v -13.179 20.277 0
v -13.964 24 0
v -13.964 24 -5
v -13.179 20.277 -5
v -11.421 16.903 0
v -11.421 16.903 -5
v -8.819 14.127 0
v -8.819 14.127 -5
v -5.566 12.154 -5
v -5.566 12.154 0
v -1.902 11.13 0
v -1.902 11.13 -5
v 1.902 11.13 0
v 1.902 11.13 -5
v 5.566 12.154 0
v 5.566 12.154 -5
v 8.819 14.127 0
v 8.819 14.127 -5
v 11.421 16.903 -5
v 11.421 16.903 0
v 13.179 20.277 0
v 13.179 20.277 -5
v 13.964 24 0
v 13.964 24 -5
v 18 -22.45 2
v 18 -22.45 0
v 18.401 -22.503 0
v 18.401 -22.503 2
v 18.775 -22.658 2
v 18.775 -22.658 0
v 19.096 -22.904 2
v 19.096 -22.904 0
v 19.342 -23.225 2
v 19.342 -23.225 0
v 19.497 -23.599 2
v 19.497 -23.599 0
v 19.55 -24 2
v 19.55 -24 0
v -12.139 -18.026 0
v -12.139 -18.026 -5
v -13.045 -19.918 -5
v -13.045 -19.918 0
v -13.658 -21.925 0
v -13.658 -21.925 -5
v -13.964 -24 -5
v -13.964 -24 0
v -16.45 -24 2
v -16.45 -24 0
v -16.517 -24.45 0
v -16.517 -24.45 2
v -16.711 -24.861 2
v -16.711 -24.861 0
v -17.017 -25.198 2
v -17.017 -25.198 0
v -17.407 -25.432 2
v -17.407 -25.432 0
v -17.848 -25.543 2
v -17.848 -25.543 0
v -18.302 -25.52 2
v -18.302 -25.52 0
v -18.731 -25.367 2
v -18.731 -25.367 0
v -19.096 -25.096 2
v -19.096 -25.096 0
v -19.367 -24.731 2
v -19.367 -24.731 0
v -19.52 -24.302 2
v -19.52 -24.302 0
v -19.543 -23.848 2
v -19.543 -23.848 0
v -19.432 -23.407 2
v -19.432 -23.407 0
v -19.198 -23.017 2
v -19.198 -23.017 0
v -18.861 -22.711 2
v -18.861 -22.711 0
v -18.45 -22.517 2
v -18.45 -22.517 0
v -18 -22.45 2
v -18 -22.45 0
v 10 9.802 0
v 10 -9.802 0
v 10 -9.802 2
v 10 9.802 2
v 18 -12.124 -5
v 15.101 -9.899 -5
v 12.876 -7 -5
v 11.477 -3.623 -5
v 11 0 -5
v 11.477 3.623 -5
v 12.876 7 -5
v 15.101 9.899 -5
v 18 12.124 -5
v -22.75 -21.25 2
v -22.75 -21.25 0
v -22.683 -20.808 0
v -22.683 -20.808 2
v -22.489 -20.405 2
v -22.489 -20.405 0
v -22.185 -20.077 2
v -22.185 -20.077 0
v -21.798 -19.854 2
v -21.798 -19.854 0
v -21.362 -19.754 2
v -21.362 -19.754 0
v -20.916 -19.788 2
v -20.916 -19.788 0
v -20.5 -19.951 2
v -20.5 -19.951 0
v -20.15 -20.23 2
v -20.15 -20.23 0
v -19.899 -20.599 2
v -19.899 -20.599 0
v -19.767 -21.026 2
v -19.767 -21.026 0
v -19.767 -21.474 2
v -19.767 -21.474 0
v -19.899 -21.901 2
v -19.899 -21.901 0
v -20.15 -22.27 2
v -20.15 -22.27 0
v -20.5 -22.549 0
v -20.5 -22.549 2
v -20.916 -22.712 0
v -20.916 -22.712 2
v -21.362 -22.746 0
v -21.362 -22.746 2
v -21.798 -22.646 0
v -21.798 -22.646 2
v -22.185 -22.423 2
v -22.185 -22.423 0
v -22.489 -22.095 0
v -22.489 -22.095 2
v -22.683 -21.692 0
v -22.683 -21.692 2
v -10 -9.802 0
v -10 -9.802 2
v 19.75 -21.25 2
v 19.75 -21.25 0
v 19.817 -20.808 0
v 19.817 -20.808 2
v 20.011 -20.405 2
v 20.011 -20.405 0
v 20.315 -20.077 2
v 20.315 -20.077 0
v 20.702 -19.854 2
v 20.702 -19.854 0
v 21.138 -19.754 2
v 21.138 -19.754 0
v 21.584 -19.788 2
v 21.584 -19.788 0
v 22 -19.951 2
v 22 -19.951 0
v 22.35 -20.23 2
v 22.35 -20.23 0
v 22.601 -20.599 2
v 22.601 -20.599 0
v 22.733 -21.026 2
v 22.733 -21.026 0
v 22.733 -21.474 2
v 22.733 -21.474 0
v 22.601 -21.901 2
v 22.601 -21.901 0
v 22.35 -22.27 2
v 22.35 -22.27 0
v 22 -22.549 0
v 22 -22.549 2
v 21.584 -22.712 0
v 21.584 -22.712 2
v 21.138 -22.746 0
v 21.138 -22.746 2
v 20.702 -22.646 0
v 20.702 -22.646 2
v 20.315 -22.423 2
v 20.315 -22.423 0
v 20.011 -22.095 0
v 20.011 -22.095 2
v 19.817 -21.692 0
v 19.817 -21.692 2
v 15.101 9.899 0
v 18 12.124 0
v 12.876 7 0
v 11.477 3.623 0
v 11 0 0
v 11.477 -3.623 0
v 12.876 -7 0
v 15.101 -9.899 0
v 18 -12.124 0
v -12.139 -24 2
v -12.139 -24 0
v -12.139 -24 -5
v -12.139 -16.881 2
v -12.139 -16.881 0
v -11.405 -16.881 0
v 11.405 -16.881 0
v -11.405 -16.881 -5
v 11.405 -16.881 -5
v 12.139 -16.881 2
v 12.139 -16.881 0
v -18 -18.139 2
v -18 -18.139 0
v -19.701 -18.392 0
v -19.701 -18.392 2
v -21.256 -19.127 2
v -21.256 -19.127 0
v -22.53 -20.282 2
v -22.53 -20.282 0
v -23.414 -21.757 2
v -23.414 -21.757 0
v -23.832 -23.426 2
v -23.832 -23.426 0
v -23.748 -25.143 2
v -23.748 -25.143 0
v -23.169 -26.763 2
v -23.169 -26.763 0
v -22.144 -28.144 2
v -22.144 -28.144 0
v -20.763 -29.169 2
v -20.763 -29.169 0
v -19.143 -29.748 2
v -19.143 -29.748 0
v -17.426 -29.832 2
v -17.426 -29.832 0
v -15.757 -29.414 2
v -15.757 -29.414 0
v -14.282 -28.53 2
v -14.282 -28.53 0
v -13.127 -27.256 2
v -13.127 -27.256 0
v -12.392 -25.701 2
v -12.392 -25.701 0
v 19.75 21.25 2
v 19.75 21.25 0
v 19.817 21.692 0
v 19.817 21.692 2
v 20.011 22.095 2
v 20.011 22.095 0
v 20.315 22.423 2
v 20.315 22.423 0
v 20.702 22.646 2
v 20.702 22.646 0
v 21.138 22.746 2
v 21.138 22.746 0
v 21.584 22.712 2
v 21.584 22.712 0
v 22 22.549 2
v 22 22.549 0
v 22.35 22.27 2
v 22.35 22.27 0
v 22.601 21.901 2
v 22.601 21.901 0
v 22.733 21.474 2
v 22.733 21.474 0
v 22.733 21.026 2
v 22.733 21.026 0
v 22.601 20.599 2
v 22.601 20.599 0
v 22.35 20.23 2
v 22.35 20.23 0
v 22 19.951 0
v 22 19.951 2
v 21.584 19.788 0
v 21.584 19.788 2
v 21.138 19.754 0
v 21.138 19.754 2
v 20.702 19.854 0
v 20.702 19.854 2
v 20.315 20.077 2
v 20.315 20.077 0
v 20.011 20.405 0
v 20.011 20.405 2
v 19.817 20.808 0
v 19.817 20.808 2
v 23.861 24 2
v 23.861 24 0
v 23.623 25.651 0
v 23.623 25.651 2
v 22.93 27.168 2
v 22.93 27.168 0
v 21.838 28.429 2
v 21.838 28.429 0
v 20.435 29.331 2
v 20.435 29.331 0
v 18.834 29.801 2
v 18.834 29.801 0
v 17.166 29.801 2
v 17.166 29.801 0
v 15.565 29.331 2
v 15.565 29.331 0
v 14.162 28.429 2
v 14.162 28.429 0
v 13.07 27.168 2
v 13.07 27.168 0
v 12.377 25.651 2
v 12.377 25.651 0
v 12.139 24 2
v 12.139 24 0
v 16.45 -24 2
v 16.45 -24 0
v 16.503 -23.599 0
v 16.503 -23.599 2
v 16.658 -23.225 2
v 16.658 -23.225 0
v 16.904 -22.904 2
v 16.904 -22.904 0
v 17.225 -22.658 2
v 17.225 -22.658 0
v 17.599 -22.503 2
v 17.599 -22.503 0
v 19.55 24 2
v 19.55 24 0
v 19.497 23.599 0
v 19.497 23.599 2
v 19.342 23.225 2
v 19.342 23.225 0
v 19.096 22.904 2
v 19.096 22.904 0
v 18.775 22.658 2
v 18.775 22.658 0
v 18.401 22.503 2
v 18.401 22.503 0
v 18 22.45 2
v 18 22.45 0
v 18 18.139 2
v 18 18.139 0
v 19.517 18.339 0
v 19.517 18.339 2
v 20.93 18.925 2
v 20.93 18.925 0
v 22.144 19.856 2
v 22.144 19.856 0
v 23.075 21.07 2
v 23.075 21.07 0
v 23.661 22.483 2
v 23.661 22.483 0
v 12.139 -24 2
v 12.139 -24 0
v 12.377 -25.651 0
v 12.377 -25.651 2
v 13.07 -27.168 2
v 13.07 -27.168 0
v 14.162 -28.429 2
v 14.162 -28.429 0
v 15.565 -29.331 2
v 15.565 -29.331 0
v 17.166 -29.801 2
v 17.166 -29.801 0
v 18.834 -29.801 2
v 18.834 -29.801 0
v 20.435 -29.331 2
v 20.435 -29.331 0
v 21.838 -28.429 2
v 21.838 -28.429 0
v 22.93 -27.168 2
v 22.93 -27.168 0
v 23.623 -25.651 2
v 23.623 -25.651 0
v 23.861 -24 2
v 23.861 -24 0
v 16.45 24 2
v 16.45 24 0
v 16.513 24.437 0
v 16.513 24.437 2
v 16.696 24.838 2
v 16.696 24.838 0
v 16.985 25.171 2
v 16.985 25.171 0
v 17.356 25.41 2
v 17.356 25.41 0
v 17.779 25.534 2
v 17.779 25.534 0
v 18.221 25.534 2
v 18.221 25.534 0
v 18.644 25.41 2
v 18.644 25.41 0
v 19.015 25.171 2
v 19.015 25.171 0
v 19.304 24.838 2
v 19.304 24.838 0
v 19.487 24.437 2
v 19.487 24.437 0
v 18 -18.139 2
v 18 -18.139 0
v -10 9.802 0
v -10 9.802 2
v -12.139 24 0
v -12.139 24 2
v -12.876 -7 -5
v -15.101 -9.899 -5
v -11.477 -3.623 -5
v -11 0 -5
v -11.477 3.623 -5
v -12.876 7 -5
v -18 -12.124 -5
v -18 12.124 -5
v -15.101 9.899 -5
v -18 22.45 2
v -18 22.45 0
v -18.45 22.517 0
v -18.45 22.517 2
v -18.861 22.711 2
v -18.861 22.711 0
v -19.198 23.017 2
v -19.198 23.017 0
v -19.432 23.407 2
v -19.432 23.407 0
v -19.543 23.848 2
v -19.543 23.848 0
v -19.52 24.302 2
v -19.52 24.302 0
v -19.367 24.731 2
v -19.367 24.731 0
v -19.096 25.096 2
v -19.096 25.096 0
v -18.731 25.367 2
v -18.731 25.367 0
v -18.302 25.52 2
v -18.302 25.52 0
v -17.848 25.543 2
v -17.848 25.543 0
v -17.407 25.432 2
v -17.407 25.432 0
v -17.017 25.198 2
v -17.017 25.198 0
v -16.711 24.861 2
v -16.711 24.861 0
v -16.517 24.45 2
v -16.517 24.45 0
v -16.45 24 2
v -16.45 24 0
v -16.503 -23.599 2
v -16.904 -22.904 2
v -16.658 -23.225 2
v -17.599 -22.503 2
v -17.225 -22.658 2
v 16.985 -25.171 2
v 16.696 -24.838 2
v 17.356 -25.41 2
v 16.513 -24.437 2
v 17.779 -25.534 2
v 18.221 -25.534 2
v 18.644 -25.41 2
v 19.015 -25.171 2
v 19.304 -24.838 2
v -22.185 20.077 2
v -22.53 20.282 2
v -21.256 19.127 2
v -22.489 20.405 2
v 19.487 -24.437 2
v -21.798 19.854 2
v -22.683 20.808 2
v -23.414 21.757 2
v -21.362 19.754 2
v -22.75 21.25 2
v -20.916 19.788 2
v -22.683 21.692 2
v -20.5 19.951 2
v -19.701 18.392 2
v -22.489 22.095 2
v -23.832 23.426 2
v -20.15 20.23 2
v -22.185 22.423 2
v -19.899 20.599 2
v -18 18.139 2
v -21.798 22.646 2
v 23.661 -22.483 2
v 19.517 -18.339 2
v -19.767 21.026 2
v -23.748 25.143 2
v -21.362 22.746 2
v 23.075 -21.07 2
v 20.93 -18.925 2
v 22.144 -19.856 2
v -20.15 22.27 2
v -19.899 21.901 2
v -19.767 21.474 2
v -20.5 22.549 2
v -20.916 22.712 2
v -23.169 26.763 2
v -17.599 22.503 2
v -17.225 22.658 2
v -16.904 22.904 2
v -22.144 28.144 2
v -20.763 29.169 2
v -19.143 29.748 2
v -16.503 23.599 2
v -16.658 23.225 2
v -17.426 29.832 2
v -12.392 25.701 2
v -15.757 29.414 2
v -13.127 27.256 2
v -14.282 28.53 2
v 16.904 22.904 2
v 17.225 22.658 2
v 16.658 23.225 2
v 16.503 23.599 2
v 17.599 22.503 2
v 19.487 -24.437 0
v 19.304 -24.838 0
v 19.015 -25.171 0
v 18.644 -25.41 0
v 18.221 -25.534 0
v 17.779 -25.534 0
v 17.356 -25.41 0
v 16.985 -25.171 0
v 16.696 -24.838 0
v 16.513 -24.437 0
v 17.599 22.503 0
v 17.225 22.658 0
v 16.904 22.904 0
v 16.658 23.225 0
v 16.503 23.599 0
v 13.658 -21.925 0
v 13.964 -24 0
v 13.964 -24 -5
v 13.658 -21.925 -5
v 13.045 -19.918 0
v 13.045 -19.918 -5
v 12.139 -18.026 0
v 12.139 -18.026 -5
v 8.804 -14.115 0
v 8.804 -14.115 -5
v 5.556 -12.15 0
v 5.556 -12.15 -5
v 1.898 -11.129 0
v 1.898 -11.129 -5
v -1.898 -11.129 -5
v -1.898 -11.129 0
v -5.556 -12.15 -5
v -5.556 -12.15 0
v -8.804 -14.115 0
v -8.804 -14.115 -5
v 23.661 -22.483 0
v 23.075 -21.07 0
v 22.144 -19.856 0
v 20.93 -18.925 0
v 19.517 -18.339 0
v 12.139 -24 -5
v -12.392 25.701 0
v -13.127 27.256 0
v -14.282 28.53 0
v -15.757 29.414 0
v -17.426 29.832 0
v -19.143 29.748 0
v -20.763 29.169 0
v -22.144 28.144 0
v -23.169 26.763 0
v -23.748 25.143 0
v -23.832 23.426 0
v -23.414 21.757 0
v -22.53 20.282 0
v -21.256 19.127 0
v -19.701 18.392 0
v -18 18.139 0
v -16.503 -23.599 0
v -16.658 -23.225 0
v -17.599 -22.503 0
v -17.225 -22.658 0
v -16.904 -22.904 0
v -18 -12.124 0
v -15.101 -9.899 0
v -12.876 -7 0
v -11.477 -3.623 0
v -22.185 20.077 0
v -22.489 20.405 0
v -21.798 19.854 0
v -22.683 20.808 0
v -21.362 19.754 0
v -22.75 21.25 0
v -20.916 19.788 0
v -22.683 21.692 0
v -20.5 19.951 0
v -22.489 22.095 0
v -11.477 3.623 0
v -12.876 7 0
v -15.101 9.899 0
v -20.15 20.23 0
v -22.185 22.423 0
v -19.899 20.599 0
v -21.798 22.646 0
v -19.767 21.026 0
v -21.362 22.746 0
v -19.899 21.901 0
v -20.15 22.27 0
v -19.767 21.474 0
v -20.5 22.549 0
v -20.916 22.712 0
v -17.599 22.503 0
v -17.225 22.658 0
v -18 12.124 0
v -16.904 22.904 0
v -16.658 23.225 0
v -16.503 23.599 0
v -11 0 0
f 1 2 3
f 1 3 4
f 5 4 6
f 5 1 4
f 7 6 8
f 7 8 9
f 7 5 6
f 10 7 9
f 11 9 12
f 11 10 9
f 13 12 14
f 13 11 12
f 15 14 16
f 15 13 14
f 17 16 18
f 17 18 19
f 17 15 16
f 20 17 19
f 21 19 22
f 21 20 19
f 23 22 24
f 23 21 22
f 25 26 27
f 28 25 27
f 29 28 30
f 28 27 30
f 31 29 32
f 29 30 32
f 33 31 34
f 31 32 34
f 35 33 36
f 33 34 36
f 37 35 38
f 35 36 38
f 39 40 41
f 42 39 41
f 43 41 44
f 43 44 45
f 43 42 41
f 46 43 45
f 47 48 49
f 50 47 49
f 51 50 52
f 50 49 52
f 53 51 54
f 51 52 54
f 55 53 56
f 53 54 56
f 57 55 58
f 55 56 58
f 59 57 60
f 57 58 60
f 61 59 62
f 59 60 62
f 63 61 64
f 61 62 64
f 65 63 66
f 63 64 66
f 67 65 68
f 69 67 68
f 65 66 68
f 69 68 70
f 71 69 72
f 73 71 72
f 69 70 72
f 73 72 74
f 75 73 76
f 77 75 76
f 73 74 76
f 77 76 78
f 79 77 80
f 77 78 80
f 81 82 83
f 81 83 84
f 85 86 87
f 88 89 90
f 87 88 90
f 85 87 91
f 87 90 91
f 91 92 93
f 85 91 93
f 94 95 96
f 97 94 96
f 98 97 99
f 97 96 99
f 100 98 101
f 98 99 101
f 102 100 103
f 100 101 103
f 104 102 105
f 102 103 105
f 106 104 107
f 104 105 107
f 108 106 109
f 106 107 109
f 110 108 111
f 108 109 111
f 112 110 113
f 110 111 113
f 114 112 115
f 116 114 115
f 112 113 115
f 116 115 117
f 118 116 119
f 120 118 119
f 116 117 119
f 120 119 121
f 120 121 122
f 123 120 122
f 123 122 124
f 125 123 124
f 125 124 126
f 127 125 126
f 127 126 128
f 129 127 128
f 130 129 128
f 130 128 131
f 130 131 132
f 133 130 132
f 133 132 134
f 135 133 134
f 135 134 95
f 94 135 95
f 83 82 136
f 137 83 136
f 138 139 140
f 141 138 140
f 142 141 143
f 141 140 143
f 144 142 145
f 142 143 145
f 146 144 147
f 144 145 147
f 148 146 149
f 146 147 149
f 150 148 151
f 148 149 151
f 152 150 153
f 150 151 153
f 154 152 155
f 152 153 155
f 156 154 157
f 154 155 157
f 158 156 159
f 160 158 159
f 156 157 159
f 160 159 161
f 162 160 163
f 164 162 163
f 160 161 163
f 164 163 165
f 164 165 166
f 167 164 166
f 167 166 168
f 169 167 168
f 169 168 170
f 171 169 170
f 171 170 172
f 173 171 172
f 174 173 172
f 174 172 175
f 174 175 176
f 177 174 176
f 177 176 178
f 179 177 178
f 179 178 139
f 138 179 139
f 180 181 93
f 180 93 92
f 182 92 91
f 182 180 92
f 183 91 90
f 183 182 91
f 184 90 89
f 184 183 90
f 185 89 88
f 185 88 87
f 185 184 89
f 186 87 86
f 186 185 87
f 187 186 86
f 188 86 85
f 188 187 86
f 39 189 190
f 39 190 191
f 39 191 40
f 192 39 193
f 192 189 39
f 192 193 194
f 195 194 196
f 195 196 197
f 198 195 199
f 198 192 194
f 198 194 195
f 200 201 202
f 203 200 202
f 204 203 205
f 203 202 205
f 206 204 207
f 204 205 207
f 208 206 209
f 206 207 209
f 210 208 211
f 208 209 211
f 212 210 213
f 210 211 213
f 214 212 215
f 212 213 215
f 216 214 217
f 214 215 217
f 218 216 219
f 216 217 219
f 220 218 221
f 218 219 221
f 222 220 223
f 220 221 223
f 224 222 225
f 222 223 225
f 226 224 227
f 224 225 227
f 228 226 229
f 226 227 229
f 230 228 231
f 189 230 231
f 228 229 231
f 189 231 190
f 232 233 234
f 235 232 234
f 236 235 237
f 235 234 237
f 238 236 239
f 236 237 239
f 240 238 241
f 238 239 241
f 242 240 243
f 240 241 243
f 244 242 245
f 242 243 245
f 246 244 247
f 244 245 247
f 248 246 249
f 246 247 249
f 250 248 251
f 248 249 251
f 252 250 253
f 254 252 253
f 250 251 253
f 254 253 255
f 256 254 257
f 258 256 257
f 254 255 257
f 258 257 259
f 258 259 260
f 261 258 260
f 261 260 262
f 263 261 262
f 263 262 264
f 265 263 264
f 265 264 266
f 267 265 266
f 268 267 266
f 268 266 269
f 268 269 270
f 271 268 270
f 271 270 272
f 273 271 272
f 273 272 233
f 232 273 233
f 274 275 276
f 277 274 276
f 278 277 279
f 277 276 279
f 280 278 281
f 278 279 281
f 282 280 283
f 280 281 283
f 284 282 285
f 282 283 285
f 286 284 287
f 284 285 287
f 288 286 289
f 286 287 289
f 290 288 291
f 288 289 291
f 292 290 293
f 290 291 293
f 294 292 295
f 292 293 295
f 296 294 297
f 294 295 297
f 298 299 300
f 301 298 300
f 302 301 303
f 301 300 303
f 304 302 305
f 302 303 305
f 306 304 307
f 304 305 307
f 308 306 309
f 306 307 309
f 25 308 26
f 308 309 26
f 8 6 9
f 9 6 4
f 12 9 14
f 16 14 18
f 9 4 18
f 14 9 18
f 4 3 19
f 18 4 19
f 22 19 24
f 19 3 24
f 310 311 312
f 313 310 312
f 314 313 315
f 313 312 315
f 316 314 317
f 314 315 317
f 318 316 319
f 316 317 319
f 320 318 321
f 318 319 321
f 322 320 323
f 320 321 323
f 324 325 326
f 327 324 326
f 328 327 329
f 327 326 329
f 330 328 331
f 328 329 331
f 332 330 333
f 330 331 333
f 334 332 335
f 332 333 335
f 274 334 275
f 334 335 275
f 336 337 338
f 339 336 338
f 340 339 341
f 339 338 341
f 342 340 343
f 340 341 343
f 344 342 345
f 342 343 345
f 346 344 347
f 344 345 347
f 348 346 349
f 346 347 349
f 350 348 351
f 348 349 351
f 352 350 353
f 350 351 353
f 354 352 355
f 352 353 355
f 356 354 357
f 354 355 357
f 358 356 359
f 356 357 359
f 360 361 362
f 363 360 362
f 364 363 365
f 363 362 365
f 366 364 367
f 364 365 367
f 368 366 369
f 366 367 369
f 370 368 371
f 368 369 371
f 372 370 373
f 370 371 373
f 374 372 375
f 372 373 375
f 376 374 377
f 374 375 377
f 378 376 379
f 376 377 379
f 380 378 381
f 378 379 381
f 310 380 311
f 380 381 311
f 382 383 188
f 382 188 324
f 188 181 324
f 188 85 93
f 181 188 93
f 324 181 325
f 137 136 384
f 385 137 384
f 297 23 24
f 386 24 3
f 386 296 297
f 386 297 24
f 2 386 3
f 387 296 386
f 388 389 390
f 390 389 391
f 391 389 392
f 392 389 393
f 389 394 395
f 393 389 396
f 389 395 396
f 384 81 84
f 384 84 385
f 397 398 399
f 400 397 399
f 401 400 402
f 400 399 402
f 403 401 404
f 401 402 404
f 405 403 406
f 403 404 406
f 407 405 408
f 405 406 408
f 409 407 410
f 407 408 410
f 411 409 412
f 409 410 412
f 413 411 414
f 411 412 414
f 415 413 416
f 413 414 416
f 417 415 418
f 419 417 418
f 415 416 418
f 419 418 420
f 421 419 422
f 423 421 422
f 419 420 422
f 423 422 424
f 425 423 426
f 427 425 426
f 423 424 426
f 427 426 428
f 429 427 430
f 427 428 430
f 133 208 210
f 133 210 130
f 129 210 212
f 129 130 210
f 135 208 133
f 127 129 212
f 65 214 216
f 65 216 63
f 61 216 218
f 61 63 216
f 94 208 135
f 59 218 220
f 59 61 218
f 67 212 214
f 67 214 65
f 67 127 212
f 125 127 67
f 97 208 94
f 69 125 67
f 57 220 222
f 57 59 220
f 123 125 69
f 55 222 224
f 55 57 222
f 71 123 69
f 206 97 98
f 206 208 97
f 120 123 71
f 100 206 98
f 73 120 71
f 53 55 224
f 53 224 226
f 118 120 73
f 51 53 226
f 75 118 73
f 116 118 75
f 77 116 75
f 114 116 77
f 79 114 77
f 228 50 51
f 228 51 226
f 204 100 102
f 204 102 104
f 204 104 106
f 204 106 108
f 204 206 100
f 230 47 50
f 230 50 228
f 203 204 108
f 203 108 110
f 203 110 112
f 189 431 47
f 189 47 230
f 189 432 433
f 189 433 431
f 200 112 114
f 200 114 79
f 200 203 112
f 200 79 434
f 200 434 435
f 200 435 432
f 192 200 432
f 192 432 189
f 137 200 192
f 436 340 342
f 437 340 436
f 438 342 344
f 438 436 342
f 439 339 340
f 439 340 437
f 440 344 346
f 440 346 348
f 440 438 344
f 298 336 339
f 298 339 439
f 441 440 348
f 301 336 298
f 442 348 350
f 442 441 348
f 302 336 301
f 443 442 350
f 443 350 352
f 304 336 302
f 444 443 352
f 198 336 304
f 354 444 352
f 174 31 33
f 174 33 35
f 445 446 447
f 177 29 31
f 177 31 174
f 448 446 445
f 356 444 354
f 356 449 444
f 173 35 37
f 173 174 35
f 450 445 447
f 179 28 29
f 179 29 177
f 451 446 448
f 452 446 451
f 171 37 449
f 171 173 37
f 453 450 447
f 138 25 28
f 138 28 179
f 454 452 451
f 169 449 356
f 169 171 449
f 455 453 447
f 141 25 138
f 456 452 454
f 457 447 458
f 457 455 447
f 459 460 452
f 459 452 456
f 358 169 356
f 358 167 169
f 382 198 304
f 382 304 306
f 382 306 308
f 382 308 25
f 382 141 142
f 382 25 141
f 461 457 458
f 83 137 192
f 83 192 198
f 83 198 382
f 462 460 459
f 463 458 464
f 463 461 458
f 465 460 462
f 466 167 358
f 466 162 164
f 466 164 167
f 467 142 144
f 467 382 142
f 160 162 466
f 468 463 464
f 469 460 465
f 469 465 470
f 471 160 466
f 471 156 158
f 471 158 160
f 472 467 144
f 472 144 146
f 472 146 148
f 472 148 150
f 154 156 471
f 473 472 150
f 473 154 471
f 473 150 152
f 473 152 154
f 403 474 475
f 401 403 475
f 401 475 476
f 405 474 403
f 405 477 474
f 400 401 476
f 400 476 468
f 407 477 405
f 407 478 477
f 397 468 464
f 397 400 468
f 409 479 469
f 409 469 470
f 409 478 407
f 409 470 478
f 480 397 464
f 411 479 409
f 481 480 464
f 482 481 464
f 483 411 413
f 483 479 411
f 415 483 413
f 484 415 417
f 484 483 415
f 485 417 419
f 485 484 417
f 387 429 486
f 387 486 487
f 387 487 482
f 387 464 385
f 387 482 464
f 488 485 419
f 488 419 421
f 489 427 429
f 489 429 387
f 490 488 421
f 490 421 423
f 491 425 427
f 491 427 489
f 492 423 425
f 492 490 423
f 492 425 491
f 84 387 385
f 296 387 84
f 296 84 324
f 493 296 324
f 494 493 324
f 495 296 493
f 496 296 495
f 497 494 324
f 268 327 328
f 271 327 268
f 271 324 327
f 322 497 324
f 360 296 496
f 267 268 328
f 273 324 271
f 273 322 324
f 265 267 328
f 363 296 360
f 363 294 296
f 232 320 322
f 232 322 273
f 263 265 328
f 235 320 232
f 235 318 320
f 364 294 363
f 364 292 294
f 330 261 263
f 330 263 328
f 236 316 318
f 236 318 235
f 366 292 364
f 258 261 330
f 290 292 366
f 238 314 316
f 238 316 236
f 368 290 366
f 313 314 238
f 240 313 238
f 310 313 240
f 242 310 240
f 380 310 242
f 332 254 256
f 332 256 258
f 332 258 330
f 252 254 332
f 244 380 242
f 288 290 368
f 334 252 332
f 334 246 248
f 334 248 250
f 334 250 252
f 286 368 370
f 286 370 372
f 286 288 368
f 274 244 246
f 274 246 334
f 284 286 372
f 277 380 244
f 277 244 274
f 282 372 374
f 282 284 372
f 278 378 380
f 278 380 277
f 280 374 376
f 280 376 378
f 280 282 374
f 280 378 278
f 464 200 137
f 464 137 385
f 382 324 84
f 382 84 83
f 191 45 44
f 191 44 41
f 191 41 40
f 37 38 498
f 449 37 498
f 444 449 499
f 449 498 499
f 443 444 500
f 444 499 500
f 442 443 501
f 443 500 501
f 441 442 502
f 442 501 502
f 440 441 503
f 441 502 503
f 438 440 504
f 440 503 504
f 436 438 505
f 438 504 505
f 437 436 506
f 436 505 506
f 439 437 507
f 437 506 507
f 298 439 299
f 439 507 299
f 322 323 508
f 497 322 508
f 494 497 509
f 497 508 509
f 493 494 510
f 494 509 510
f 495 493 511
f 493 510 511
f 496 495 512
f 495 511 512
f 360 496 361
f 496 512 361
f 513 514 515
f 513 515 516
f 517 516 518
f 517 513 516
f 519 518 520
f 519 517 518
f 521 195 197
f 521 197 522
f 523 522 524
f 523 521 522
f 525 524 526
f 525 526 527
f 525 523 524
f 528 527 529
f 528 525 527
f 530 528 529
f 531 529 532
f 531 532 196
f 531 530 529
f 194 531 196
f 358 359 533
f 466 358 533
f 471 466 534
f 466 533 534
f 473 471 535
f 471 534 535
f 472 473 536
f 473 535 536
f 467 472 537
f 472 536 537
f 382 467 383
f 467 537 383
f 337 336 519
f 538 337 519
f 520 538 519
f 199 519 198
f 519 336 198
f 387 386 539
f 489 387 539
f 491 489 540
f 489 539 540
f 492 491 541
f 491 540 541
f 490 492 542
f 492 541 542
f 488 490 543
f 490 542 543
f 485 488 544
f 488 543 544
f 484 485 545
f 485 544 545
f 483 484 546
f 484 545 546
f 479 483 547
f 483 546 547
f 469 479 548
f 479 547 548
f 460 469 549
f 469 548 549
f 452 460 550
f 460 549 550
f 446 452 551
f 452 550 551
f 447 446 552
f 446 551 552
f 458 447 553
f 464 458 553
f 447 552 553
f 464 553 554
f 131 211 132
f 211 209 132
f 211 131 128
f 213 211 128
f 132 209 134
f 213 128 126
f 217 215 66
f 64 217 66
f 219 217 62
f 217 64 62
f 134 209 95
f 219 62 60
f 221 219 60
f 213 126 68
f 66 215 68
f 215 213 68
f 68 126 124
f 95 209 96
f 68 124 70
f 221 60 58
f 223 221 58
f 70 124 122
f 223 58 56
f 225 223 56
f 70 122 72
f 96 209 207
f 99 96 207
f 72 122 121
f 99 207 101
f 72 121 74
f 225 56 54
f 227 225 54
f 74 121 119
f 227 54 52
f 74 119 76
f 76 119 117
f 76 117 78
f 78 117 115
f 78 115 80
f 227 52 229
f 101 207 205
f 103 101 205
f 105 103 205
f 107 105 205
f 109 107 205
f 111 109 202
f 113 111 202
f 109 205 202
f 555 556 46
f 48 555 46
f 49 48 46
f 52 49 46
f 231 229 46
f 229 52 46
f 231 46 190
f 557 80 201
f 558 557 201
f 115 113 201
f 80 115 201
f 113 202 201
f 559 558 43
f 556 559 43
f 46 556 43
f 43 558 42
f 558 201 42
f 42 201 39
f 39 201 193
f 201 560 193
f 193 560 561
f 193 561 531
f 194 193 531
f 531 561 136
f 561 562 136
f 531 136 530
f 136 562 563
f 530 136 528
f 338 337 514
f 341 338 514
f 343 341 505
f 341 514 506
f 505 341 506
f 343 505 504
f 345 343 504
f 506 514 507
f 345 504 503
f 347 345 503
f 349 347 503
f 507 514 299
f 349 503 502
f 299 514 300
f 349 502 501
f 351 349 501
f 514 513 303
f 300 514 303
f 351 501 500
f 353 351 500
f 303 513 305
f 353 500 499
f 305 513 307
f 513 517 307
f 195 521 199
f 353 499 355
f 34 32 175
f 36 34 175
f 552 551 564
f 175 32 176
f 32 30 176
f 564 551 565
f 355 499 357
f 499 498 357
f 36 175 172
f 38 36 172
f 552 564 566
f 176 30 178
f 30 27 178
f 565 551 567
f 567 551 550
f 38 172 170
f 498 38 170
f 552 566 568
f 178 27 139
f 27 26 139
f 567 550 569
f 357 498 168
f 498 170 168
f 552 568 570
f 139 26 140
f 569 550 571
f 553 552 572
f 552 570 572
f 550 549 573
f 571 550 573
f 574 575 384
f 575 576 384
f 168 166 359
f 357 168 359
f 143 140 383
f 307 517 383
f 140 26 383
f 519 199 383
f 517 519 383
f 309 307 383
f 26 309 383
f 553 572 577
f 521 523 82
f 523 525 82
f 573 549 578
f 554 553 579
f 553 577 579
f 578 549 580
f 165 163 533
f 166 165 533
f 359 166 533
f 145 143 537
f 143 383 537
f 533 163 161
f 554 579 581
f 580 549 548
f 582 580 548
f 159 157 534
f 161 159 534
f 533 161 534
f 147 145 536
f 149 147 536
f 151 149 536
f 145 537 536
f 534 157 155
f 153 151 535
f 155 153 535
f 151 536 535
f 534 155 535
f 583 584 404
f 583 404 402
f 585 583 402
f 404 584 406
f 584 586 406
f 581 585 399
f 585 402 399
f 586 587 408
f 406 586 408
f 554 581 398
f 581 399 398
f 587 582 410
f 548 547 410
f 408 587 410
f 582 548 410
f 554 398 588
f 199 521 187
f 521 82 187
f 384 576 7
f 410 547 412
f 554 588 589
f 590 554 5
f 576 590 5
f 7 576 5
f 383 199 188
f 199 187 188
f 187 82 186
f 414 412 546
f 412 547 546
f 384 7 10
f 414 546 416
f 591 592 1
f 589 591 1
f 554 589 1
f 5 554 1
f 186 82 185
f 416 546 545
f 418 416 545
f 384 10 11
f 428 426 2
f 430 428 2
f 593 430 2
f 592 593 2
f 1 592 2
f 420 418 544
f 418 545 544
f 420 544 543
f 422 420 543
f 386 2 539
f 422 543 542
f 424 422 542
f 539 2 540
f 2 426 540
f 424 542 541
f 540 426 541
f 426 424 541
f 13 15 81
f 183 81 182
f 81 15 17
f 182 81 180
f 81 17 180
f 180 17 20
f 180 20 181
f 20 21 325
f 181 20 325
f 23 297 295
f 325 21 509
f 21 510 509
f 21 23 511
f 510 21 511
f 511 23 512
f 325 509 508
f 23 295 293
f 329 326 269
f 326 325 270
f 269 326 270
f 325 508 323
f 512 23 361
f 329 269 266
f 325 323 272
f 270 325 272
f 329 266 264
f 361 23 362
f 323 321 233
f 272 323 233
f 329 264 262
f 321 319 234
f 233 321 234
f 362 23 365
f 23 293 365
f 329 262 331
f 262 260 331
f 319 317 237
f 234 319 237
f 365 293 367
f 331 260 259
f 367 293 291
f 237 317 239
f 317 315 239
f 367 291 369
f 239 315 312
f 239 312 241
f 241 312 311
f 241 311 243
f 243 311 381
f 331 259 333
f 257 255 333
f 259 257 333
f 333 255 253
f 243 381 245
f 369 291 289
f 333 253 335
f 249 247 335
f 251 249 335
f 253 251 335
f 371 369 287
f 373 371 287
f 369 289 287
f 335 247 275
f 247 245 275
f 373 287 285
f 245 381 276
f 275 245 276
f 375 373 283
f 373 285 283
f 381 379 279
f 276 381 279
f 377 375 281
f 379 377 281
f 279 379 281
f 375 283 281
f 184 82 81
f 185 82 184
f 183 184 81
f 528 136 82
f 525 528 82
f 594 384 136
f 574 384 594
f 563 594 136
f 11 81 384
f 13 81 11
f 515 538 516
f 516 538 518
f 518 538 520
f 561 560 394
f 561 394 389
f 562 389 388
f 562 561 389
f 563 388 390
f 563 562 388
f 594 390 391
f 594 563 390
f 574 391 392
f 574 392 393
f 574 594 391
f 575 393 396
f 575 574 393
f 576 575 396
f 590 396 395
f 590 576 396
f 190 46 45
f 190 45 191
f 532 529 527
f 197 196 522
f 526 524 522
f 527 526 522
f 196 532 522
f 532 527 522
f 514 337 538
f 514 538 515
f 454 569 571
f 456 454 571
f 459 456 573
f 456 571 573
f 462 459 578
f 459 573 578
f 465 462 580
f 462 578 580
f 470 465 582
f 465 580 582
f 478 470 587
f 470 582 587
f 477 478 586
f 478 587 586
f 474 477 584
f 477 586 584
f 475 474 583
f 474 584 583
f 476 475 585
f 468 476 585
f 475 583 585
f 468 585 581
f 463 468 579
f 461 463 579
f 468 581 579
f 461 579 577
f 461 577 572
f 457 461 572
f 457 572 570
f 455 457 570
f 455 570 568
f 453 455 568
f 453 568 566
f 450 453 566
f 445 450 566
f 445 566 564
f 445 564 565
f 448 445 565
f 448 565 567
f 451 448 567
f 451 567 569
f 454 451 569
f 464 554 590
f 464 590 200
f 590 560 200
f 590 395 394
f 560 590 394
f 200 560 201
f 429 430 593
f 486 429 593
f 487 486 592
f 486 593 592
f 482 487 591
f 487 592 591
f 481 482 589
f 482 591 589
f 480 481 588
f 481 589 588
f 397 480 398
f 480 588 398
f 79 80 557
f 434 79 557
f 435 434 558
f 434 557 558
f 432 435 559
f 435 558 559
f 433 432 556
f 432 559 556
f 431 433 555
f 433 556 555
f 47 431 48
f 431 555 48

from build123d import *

# Parameters (mm, degrees)
EXTRUDE_1_DEPTH     = 5
EXTRUDE_1_2_DEPTH   = 5
EXTRUDE_1_3_DEPTH   = 5
EXTRUDE_1_4_DEPTH   = 5
EXTRUDE_3_DEPTH     = 2
SKETCH_3_W          = 20
SKETCH_3_H          = 19.604409946
CUT_EXTRUDE_1_DEPTH = 2
SKETCH_4_R          = 1.5
CUT_EXTRUDE_2_DEPTH = 12
SKETCH_6_W          = 24.27884079
SKETCH_6_H          = 14.237664084
CUT_EXTRUDE_5_DEPTH = 10


with BuildPart() as part:
    # 草图1 → 凸台-拉伸1 (new body)
    with BuildSketch(Plane.XY):
        with BuildLine():
            Line((13.964240044, 24), (-13.964240044, 24))
            ThreePointArc((-13.964240044, 24), (0, 11), (13.964240044, 24))
        make_face()
    extrude(amount=-EXTRUDE_1_DEPTH)



with BuildPart() as body_2:
    # 草图1 → Extrude 1 2 (new body)
    with BuildSketch(Plane.XY):
        with BuildLine():
            ThreePointArc((-18, -12.124355653), (-11, 0), (-18, 12.124355653))
            Line((-18, 12.124355653), (-18, -12.124355653))
        make_face()
    extrude(amount=-EXTRUDE_1_2_DEPTH)


with BuildPart() as body_3:
    # 草图1 → Extrude 1 3 (new body)
    with BuildSketch(Plane.XY):
        with BuildLine():
            Line((18, -12.124355653), (18, 12.124355653))
            ThreePointArc((18, 12.124355653), (11, 0), (18, -12.124355653))
        make_face()
    extrude(amount=-EXTRUDE_1_3_DEPTH)


with BuildPart() as body_4:
    # 草图1 → Extrude 1 4 (new body)
    with BuildSketch(Plane.XY):
        with BuildLine():
            ThreePointArc((13.964240044, -24), (0, -11), (-13.964240044, -24))
            Line((-13.964240044, -24), (13.964240044, -24))
        make_face()
    extrude(amount=-EXTRUDE_1_4_DEPTH)


with BuildPart() as part_1:
    add(part.part)

    add(body_2.part)  # 凸台-拉伸3 merges body 2

    add(body_3.part)  # 凸台-拉伸3 merges body 3

    add(body_4.part)  # 凸台-拉伸3 merges body 4
    # 草图2 → 凸台-拉伸3 (add)
    with BuildSketch(Plane.XY):
        with BuildLine():
            ThreePointArc((-18, 22.45), (-19.096015511, 25.096015511), (-16.45, 24))
            Line((-16.45, 24), (-12.139420395, 24))
            ThreePointArc((-12.139420395, 24), (-22.14405558, 28.14405558), (-18, 18.139420395))
            Line((-18, 18.139420395), (-18, 22.45))
        make_face()
        with BuildLine():
            Line((-12.139420395, 24), (-16.45, 24))
            ThreePointArc((-16.45, 24), (-16.903984489, 22.903984489), (-18, 22.45))
            Line((-18, 22.45), (-18, 18.139420395))
            ThreePointArc((-18, 18.139420395), (-13.85594442, 19.85594442), (-12.139420395, 24))
        make_face()
        with BuildLine():
            Line((12.139420395, 24), (-12.139420395, 24))
            ThreePointArc((-12.139420395, 24), (-13.85594442, 19.85594442), (-18, 18.139420395))
            Line((-18, 18.139420395), (-18, 12.124355653))
            ThreePointArc((-18, 12.124355653), (-11, 0), (-18, -12.124355653))
            Line((-18, -12.124355653), (-18, -18.139420395))
            ThreePointArc((-18, -18.139420395), (-13.85594442, -19.85594442), (-12.139420395, -24))
            Line((-12.139420395, -24), (12.139420395, -24))
            ThreePointArc((12.139420395, -24), (13.85594442, -19.85594442), (18, -18.139420395))
            Line((18, -18.139420395), (18, 18.139420395))
            ThreePointArc((18, 18.139420395), (13.85594442, 19.85594442), (12.139420395, 24))
        make_face()
        with BuildLine():
            ThreePointArc((-18, -12.124355653), (-11, 0), (-18, 12.124355653))
            Line((-18, 12.124355653), (-18, -12.124355653))
        make_face()
        with BuildLine():
            ThreePointArc((23.860579605, 24), (18, 29.860579605), (12.139420395, 24))
            Line((12.139420395, 24), (16.45, 24))
            ThreePointArc((16.45, 24), (18, 25.55), (19.55, 24))
            ThreePointArc((19.55, 24), (19.096015511, 22.903984489), (18, 22.45))
            Line((18, 22.45), (18, 18.139420395))
            ThreePointArc((18, 18.139420395), (22.14405558, 19.85594442), (23.860579605, 24))
        make_face()
        with BuildLine():
            Line((16.45, 24), (12.139420395, 24))
            ThreePointArc((12.139420395, 24), (13.85594442, 19.85594442), (18, 18.139420395))
            Line((18, 18.139420395), (18, 22.45))
            ThreePointArc((18, 22.45), (16.903984489, 22.903984489), (16.45, 24))
        make_face()
        with BuildLine():
            ThreePointArc((-12.139420395, -24), (-13.85594442, -19.85594442), (-18, -18.139420395))
            Line((-18, -18.139420395), (-18, -22.45))
            ThreePointArc((-18, -22.45), (-16.903984489, -22.903984489), (-16.45, -24))
            Line((-16.45, -24), (-12.139420395, -24))
        make_face()
        with BuildLine():
            Line((-18, -22.45), (-18, -18.139420395))
            ThreePointArc((-18, -18.139420395), (-22.14405558, -28.14405558), (-12.139420395, -24))
            Line((-12.139420395, -24), (-16.45, -24))
            ThreePointArc((-16.45, -24), (-19.096015511, -25.096015511), (-18, -22.45))
        make_face()
        with BuildLine():
            ThreePointArc((23.860579605, -24), (22.14405558, -19.85594442), (18, -18.139420395))
            Line((18, -18.139420395), (18, -22.45))
            ThreePointArc((18, -22.45), (19.096015511, -22.903984489), (19.55, -24))
            ThreePointArc((19.55, -24), (18, -25.55), (16.45, -24))
            Line((16.45, -24), (12.139420395, -24))
            ThreePointArc((12.139420395, -24), (18, -29.860579605), (23.860579605, -24))
        make_face()
        with BuildLine():
            Line((18, -22.45), (18, -18.139420395))
            ThreePointArc((18, -18.139420395), (13.85594442, -19.85594442), (12.139420395, -24))
            Line((12.139420395, -24), (16.45, -24))
            ThreePointArc((16.45, -24), (16.903984489, -22.903984489), (18, -22.45))
        make_face()
    extrude(amount=EXTRUDE_3_DEPTH)

    # 草图3 → 切除-拉伸1 (cut)
    with BuildSketch(Plane(origin=(0, 0, 0), x_dir=(-1, 0, 0), z_dir=(0, 0, -1))):
        Rectangle(SKETCH_3_W, SKETCH_3_H)
    extrude(amount=-CUT_EXTRUDE_1_DEPTH, mode=Mode.SUBTRACT)

    # 草图4 → 切除-拉伸2 (cut)
    with BuildSketch(Plane(origin=(0, 0, -5), x_dir=(-1, 0, 0), z_dir=(0, 0, -1))):
        with Locations((21.25, -21.25)):
            Circle(SKETCH_4_R)
        with Locations((21.25, 21.25)):
            Circle(SKETCH_4_R)
        with Locations((-21.25, 21.25)):
            Circle(SKETCH_4_R)
        with Locations((-21.25, -21.25)):
            Circle(SKETCH_4_R)
    extrude(amount=-CUT_EXTRUDE_2_DEPTH, mode=Mode.SUBTRACT)

    # 草图6 → 切除-拉伸5 (cut)
    with BuildSketch(Plane.XY.offset(2)):
        with Locations((0, -24)):
            Rectangle(SKETCH_6_W, SKETCH_6_H)
    extrude(amount=-CUT_EXTRUDE_5_DEPTH, mode=Mode.SUBTRACT)


solid = part_1.part
